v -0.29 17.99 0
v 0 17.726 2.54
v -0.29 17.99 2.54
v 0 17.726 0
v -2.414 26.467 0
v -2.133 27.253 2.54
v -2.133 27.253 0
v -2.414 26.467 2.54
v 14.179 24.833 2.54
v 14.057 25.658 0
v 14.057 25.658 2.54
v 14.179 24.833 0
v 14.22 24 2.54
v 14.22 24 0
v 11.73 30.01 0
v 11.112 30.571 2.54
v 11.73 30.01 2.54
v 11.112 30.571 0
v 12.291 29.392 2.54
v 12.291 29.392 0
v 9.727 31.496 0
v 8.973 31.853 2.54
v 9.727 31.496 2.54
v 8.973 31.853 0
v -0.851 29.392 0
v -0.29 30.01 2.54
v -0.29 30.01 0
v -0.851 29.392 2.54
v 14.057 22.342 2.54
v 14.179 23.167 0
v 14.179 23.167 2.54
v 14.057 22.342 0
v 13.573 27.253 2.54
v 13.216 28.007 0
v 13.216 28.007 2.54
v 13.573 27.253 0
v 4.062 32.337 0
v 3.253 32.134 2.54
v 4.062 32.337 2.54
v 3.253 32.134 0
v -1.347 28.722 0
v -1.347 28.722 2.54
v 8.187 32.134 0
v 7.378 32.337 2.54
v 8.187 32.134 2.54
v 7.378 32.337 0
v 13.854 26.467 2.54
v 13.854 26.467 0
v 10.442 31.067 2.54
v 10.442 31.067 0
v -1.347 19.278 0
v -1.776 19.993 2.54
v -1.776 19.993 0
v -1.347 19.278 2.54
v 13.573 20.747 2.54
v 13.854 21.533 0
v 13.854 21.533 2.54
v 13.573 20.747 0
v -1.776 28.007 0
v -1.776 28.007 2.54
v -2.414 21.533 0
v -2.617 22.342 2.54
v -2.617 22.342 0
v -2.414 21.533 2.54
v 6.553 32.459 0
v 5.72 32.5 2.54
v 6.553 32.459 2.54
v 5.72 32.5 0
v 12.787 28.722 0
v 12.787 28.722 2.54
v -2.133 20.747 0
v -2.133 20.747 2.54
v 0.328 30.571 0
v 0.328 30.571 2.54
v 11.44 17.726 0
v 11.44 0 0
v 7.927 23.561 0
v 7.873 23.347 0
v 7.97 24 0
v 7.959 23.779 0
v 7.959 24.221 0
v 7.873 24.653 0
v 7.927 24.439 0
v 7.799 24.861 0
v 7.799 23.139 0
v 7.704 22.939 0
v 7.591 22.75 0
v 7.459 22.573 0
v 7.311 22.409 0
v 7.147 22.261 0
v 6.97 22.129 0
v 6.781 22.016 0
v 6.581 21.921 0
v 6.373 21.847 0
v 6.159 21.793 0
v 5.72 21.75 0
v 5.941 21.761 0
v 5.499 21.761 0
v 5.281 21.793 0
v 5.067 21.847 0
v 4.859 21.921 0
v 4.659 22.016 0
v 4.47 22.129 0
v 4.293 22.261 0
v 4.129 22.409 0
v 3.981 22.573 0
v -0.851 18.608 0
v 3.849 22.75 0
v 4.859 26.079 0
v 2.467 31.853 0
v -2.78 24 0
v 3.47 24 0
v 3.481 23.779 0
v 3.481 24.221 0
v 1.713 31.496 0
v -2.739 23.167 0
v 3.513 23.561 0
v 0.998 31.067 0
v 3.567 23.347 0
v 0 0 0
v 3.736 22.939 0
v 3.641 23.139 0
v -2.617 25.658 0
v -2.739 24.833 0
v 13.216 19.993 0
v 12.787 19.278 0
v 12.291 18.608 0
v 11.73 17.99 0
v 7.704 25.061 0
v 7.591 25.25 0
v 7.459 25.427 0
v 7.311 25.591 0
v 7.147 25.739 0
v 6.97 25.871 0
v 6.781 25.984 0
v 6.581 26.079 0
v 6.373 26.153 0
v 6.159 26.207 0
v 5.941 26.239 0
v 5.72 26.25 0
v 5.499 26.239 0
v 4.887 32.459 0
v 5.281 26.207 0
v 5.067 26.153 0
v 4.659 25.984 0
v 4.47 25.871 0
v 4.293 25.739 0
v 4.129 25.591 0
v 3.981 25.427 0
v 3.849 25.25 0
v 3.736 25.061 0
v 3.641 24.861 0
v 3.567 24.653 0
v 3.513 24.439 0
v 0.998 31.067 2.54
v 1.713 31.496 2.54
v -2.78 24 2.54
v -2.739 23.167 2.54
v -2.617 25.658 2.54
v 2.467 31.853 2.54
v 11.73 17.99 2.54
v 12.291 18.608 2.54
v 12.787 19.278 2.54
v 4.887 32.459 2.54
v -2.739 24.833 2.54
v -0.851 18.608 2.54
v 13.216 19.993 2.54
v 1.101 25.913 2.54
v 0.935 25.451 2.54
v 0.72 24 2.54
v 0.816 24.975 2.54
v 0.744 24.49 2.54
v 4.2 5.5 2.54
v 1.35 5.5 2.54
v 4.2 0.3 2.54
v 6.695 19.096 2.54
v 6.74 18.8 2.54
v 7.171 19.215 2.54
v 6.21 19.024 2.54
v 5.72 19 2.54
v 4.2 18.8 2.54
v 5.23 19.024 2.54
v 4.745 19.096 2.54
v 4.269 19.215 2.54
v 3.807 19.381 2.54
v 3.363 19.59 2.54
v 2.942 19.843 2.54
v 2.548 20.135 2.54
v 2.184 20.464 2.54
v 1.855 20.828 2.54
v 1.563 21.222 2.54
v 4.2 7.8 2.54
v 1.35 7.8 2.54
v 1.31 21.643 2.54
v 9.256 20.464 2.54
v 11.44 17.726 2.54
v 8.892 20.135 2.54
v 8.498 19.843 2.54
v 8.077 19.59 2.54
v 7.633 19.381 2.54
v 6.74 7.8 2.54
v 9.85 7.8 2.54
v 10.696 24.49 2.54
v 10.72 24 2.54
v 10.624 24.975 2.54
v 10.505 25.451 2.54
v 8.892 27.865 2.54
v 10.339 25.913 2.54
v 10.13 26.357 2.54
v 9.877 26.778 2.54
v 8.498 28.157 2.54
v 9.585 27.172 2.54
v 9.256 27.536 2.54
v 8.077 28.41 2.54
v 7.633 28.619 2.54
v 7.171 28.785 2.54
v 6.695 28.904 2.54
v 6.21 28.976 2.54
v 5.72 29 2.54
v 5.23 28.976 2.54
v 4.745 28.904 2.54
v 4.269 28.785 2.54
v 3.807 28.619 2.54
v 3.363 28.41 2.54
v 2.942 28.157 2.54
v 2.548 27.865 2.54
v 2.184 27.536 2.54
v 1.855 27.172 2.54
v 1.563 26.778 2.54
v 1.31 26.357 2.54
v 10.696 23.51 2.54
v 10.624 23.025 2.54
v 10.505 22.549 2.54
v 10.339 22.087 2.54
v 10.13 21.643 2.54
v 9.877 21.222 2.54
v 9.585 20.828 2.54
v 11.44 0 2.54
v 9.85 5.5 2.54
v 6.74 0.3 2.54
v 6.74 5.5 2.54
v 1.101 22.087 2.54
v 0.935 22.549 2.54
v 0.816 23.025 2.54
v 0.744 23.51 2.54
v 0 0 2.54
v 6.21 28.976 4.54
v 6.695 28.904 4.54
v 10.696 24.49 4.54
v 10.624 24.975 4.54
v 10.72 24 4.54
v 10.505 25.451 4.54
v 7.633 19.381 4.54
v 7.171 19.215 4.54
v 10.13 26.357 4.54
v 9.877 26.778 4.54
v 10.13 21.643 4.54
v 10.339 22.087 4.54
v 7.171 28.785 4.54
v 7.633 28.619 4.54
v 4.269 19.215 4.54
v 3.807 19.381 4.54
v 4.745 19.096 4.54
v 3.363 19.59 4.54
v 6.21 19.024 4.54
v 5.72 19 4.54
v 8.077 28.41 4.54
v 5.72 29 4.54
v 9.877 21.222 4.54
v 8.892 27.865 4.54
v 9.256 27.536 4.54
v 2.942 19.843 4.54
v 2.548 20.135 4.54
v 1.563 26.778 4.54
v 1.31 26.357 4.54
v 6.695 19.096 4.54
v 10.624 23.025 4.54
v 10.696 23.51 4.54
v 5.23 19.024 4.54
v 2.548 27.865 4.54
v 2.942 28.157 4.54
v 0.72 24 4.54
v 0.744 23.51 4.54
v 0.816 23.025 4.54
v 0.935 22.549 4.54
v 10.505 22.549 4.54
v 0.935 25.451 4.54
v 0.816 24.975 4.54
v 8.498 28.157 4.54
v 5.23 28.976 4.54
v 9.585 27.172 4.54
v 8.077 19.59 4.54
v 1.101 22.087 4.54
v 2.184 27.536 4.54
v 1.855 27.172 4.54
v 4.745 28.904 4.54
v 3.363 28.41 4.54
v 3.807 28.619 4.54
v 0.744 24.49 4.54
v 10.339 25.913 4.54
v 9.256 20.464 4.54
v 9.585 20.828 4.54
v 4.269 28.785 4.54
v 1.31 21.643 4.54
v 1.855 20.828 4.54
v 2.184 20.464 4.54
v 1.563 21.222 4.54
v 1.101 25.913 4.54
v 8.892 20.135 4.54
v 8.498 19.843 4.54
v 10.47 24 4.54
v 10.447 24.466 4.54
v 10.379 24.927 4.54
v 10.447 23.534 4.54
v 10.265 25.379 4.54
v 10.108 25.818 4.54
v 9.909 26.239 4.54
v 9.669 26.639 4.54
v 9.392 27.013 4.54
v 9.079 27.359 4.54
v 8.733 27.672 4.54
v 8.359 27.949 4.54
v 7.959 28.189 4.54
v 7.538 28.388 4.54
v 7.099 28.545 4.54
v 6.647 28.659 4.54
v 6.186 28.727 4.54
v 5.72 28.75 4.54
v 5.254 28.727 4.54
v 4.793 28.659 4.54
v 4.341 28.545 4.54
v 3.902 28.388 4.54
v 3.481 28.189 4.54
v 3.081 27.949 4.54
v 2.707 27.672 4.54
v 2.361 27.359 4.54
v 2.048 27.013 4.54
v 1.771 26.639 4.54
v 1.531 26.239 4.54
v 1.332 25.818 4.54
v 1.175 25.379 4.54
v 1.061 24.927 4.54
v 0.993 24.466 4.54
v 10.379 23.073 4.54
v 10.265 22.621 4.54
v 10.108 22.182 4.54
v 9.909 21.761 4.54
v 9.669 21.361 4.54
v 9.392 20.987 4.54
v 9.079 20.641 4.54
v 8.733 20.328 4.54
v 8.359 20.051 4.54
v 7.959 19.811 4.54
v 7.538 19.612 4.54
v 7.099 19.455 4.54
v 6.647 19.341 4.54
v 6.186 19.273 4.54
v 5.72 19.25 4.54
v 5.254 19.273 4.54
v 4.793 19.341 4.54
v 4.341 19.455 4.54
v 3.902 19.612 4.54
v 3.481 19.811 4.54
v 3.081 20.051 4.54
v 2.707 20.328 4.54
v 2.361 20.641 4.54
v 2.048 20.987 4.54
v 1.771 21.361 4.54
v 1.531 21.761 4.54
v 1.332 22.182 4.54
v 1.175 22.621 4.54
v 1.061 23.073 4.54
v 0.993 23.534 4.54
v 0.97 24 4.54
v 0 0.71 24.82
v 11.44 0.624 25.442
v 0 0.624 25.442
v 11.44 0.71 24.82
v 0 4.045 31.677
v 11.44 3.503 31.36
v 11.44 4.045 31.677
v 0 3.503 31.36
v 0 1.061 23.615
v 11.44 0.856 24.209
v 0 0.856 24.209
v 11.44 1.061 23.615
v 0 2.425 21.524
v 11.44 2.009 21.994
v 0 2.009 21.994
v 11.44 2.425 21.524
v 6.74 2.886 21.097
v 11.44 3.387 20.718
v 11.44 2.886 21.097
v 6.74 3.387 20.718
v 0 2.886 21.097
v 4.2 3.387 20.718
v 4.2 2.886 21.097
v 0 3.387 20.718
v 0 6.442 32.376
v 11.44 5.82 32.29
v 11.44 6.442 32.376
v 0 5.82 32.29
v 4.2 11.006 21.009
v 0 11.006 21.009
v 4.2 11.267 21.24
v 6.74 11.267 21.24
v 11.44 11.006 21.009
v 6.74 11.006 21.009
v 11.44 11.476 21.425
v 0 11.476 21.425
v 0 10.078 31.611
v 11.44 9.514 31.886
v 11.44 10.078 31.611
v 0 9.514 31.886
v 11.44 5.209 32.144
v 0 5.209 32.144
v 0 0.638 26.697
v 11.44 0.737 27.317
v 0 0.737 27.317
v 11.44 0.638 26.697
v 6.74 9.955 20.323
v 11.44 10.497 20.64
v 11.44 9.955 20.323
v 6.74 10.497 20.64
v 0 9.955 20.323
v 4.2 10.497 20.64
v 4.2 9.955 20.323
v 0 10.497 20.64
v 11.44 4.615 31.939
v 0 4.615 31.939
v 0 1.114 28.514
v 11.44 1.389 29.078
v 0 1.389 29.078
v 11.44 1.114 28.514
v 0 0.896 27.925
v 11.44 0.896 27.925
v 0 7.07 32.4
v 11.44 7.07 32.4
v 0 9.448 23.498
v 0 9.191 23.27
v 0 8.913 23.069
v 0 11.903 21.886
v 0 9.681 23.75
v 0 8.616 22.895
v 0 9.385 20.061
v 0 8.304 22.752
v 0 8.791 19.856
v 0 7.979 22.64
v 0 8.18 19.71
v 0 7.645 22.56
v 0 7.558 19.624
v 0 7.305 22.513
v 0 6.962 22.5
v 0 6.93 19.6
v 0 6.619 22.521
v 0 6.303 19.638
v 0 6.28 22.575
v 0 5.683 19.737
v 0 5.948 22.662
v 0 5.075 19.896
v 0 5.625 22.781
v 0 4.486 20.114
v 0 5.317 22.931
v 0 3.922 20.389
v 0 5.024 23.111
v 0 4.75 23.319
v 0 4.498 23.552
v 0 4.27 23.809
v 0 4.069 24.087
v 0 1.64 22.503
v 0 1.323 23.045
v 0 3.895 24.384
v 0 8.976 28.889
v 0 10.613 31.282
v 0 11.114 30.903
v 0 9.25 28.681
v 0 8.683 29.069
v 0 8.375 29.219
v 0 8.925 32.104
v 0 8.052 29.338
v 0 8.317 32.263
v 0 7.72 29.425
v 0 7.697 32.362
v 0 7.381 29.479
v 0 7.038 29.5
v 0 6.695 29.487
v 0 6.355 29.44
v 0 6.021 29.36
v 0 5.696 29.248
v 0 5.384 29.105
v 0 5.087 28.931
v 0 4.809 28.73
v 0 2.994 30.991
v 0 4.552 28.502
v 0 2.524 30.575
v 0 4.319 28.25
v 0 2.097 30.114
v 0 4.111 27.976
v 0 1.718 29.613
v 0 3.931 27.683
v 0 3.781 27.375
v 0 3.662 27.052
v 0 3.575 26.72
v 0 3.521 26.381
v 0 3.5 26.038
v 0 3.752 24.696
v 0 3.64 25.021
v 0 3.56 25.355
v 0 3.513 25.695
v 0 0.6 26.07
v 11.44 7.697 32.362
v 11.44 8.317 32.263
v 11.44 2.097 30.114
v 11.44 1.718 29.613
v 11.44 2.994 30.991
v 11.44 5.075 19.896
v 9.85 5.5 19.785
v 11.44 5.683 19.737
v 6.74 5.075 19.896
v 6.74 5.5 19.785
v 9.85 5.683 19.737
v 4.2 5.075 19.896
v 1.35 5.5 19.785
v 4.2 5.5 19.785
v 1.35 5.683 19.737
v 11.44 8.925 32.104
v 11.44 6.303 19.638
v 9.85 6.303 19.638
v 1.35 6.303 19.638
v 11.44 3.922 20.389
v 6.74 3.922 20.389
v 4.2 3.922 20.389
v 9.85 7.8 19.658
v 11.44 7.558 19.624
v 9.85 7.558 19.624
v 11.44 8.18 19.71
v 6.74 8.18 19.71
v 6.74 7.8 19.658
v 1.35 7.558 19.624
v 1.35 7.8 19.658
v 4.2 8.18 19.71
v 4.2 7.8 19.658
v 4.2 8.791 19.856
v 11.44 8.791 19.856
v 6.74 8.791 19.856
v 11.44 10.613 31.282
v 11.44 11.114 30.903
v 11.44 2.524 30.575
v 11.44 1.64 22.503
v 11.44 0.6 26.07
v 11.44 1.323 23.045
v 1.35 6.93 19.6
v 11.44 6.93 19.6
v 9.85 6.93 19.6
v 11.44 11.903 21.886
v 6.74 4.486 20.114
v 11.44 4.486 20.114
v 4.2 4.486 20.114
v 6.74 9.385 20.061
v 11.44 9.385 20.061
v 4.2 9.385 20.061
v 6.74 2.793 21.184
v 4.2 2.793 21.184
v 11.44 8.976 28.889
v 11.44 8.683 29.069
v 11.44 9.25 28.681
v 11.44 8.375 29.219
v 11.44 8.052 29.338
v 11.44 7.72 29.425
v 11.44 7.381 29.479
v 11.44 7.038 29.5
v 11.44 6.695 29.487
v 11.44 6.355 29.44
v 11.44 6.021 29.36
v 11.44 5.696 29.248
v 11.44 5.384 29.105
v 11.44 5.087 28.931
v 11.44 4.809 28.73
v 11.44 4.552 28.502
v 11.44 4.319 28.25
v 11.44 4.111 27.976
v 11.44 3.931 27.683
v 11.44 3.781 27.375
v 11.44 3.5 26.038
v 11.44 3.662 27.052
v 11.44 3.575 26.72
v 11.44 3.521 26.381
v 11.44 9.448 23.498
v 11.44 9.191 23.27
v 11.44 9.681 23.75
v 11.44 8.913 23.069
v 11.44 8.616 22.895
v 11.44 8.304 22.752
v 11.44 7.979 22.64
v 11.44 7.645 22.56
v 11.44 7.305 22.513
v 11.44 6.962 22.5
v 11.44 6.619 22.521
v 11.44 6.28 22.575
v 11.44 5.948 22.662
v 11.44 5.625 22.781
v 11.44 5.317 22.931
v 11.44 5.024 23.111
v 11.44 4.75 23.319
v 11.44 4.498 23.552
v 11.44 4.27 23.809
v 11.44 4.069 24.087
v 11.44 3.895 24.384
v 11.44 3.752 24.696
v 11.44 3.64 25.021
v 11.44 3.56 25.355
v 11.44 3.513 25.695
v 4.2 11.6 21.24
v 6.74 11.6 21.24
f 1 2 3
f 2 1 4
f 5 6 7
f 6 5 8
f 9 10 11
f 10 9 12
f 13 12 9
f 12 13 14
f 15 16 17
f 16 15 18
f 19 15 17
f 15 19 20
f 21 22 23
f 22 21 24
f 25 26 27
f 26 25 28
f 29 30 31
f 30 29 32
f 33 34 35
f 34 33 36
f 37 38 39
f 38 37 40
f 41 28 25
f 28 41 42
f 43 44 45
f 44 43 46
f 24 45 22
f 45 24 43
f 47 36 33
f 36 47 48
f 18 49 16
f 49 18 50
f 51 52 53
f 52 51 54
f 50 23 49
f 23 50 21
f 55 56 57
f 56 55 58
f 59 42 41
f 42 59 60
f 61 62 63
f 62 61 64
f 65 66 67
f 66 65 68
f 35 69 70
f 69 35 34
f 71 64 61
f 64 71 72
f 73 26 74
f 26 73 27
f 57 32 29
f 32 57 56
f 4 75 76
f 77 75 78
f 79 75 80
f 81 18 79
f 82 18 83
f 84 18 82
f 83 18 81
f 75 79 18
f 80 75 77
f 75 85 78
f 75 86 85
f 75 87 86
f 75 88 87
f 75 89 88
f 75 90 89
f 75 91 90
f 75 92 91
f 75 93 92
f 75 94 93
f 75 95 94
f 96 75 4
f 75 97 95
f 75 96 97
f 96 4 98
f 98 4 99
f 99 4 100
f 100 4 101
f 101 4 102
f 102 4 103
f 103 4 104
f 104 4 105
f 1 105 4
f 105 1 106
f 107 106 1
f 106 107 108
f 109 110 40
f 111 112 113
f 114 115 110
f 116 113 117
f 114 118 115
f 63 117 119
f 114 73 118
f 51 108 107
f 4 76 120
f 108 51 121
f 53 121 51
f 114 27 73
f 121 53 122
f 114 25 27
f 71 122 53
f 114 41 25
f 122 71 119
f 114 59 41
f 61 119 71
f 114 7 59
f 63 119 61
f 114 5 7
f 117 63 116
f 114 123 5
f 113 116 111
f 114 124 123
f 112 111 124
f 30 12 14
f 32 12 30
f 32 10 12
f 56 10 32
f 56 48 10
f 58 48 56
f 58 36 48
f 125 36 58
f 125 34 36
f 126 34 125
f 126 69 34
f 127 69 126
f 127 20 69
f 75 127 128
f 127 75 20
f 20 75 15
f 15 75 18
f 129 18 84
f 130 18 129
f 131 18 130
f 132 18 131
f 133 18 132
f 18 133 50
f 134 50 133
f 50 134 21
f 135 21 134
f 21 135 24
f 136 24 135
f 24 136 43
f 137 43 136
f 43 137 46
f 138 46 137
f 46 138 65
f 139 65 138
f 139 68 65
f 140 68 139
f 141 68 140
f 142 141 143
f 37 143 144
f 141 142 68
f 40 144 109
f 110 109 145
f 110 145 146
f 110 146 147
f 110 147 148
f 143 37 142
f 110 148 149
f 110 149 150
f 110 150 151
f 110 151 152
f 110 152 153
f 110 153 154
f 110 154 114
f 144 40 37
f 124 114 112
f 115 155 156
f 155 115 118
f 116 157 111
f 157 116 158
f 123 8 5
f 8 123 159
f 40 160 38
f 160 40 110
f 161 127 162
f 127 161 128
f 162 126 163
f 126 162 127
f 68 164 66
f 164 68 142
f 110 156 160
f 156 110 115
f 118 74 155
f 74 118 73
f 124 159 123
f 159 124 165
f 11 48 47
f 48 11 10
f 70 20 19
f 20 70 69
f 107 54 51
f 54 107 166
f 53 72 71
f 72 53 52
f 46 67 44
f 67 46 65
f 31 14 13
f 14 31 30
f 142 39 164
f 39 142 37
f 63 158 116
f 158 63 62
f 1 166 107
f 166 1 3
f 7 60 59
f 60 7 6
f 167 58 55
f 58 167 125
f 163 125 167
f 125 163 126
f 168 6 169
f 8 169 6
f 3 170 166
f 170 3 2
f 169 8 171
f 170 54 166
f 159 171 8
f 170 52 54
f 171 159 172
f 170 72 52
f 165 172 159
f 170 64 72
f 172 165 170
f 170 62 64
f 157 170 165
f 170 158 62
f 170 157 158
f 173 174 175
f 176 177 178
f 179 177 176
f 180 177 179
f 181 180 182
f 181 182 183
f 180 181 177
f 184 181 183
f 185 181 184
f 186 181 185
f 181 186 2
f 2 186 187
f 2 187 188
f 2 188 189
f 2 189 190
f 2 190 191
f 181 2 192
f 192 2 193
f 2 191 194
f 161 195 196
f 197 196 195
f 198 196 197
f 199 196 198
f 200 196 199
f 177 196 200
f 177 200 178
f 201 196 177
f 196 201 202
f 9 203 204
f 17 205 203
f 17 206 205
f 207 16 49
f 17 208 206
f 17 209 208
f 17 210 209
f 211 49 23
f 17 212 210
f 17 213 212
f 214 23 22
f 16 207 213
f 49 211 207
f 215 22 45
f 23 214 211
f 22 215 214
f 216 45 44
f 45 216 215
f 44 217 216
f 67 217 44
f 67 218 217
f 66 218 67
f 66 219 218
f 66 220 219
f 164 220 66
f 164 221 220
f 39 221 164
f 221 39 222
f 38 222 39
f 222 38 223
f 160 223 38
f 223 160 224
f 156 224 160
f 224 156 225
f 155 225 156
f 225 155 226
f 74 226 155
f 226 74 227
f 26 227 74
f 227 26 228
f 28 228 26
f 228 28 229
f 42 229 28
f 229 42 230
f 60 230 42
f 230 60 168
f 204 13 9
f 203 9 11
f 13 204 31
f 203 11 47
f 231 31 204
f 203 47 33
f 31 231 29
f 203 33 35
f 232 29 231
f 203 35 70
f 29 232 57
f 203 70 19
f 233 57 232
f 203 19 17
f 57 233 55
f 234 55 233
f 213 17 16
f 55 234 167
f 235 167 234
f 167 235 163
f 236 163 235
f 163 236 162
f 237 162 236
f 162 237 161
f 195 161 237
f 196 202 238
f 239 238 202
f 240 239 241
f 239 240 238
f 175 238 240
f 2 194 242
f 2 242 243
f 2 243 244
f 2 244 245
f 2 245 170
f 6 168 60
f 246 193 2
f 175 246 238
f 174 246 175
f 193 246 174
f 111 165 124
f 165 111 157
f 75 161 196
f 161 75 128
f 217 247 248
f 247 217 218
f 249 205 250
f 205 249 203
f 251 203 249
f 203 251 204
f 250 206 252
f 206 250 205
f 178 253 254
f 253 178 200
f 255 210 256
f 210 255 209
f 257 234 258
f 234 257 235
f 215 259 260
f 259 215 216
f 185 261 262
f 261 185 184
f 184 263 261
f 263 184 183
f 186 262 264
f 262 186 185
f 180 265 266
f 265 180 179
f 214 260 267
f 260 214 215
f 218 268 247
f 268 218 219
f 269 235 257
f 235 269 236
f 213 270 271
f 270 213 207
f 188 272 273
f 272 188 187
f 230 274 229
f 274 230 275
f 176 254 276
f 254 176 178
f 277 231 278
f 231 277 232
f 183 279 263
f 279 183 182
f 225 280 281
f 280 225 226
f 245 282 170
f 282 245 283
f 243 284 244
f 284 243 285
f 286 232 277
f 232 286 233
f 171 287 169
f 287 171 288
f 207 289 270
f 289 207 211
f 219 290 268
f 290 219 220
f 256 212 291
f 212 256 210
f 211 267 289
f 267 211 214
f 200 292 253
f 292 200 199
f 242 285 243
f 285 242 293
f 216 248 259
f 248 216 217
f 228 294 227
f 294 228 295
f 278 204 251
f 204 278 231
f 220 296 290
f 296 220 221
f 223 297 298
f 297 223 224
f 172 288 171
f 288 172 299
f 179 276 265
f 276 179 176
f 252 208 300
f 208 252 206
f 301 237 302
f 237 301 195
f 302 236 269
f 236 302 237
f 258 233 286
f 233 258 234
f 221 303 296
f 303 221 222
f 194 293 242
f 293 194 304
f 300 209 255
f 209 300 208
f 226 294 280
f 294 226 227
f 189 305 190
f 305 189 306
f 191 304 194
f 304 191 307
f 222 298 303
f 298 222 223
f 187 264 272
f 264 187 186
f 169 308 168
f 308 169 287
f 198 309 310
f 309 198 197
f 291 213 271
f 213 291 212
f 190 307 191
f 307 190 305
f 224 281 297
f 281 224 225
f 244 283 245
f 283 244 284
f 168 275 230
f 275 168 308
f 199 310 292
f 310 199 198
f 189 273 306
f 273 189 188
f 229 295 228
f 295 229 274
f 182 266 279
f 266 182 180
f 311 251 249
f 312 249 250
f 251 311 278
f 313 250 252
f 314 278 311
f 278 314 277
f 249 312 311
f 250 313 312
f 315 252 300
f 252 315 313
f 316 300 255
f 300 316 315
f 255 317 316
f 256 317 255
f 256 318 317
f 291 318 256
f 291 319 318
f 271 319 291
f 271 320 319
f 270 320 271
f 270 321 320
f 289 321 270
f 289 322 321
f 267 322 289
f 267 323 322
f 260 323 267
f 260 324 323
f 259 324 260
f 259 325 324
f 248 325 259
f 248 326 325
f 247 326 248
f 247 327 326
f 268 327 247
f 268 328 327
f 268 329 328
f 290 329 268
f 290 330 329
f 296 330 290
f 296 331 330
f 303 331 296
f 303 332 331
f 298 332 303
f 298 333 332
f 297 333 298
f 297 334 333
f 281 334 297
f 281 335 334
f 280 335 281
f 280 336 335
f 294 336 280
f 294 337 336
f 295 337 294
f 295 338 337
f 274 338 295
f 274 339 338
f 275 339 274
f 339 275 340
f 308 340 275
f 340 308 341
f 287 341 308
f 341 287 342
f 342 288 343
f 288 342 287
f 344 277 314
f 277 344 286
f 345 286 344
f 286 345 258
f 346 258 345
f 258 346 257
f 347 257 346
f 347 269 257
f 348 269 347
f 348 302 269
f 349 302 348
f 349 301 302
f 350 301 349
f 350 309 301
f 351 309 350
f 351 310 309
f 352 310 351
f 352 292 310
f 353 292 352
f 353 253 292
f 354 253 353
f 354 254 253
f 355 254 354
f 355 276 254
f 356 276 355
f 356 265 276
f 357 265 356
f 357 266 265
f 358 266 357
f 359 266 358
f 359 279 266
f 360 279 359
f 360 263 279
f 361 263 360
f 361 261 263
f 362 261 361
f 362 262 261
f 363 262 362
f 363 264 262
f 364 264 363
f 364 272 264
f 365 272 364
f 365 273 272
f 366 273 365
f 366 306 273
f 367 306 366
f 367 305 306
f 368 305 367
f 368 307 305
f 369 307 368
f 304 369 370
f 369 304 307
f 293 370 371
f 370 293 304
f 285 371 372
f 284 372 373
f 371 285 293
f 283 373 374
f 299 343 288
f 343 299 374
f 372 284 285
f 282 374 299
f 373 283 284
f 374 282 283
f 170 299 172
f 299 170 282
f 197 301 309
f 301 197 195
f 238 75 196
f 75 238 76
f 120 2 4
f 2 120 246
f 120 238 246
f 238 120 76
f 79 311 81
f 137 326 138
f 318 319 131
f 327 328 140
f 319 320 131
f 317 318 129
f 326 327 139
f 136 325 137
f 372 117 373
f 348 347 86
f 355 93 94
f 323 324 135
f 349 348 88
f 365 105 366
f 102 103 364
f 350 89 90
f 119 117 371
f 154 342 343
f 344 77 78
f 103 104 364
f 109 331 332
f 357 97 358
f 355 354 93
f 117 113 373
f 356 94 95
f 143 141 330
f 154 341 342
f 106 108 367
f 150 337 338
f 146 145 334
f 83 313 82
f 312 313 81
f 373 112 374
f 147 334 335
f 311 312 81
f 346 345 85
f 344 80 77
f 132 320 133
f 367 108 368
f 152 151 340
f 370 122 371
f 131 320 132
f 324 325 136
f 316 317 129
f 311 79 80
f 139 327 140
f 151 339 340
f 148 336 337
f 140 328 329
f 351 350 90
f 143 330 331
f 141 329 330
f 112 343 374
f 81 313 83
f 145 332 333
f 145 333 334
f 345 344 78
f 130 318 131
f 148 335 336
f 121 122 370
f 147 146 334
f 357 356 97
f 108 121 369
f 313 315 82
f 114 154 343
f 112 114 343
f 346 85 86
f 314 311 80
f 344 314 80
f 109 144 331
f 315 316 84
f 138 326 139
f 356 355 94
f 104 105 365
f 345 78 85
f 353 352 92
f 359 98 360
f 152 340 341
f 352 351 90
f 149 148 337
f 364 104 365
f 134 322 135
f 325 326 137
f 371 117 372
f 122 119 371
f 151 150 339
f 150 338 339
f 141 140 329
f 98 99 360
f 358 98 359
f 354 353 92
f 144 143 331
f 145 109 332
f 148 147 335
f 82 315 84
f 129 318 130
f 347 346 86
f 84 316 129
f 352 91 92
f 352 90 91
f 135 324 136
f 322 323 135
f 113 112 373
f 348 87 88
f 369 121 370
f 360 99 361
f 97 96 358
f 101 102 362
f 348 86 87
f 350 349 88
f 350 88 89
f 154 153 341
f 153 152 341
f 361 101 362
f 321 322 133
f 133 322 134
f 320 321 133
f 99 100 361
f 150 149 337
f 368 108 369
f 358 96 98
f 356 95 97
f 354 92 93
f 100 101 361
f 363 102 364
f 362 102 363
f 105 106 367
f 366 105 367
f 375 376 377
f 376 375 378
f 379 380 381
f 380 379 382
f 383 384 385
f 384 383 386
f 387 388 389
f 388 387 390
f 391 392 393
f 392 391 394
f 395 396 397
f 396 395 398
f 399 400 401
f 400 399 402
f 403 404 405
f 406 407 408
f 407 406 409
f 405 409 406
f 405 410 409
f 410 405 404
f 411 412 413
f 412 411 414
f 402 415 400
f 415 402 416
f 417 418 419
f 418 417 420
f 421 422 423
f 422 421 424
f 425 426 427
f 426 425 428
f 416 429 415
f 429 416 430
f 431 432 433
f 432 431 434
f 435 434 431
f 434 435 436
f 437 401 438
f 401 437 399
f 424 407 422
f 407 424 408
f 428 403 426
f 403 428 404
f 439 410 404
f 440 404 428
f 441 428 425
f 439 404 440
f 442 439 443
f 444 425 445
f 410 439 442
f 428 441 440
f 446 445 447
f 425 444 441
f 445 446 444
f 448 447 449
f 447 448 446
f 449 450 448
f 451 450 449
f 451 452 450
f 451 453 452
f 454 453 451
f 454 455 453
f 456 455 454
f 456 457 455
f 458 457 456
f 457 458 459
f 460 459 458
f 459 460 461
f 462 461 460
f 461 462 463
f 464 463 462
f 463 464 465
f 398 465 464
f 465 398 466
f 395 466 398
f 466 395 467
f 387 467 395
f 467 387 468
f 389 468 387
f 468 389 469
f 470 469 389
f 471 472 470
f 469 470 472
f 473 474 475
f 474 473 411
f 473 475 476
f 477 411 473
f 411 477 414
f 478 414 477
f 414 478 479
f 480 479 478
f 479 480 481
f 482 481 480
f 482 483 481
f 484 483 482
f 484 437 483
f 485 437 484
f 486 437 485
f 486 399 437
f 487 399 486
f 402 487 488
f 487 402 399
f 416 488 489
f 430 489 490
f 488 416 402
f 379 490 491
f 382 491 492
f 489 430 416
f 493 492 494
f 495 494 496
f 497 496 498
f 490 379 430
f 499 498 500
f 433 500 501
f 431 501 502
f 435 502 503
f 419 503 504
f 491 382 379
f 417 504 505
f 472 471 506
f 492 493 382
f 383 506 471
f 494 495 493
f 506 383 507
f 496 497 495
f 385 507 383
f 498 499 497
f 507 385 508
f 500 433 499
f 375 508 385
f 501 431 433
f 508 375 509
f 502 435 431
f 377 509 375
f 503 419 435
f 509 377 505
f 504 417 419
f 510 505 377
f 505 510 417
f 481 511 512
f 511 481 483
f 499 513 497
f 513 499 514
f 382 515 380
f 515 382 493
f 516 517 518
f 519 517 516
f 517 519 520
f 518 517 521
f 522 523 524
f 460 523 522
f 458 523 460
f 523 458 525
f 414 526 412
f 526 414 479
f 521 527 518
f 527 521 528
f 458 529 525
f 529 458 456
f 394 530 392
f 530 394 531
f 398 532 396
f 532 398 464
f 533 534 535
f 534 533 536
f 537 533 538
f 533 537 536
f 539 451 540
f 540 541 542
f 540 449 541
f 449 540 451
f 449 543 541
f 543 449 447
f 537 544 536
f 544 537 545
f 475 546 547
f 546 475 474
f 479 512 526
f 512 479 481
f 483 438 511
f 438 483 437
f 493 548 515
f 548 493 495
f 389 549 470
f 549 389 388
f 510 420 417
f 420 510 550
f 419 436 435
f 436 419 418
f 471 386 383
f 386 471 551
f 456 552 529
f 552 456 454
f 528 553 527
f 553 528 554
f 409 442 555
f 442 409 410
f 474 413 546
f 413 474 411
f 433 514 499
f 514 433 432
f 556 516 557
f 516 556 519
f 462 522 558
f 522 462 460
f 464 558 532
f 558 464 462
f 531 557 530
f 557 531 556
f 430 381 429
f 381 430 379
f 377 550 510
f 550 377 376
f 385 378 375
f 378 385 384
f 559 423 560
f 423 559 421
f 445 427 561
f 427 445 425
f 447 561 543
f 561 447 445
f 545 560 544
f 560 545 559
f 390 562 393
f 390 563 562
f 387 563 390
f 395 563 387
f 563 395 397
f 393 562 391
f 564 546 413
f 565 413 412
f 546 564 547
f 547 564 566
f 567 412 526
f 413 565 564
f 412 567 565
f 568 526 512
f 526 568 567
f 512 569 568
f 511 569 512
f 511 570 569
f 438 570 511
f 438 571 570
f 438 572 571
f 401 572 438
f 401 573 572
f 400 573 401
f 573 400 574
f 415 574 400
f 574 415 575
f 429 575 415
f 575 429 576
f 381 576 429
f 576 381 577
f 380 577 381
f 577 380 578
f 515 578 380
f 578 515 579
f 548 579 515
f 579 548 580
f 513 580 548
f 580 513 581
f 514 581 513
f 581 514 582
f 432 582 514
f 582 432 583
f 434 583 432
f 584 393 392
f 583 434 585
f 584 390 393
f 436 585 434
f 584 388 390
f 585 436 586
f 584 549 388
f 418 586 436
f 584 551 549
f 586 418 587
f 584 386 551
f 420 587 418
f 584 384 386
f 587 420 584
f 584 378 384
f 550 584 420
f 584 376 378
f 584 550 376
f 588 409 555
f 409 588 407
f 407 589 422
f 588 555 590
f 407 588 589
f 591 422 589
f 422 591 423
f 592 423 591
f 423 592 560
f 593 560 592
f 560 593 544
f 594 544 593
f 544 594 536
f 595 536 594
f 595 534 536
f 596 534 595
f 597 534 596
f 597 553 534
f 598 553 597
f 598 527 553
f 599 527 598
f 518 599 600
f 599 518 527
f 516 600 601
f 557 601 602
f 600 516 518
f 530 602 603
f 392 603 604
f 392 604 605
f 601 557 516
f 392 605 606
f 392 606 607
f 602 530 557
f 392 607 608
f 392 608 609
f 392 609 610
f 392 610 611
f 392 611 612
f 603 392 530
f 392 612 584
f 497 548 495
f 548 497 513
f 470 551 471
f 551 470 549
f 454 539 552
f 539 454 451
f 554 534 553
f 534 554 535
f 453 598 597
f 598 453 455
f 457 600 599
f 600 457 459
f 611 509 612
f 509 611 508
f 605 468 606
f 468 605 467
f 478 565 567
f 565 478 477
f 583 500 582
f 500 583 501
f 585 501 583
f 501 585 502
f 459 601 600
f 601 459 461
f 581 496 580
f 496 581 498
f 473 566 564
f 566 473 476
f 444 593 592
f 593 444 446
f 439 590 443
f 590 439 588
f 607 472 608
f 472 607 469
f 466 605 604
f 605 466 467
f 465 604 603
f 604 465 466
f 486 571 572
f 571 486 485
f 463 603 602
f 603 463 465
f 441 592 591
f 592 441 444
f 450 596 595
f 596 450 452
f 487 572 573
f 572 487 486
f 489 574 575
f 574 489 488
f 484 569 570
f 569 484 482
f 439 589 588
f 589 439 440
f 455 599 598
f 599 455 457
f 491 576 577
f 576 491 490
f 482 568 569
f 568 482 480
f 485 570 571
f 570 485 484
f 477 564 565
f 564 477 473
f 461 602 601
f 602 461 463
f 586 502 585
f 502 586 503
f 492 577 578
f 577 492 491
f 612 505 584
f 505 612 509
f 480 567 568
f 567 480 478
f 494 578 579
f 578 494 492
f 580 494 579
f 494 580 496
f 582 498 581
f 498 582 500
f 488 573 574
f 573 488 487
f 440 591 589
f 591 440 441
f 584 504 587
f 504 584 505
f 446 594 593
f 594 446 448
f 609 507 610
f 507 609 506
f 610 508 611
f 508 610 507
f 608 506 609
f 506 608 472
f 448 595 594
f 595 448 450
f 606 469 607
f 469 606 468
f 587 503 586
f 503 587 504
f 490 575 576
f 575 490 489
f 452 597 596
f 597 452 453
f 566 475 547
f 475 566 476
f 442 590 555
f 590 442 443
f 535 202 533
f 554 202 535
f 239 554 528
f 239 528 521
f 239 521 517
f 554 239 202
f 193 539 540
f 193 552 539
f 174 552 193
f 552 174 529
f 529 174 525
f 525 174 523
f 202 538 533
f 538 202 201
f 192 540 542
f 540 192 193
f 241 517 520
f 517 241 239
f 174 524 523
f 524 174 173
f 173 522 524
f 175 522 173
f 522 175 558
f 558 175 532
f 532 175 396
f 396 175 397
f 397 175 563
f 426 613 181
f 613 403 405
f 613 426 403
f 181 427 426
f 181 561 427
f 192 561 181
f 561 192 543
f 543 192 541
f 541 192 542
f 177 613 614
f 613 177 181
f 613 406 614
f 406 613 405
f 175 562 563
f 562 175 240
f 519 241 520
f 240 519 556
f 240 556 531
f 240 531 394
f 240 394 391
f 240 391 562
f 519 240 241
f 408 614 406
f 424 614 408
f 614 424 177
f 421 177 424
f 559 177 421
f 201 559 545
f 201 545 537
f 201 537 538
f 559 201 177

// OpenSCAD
/* Copyleft Roy Sigurd Karlsbakk <roy@karlsbakk.net> 2019
 * Dings for å ersatatte drit fra Plantasjen
 *
 * Lisens  CC BY-NC https://creativecommons.org/licenses/by-nc/4.0/legalcode.no
 * License CC BY-NC https://creativecommons.org/licenses/by-nc/4.0/legalcode
 */

$fn=64;

cube_x=11.44;
cube_y=19.25;
cube_z=2.54;

wall_width=cube_z;

bottom_cube=[cube_x,cube_y,cube_z];
circle_center=[cube_x/2,24];
outer_circle_d=17;
cone_outer_d=10;
cone_inner_d=4.5;
cone_edge=0.5;
screw_cyl_height=2;
cone_height=screw_cyl_height+cube_z;
out_pin_thickness=2.54;
out_pin_x=8.5;
out_pin_y=2.3;
out_pin_z=18;
out_pin_origo=[1.35,5.5,cube_z];
back_out_y_bottom=0.5;
back_out_y_top=3.2;
front_out_y_bottom=back_out_y_bottom+19;
front_out_y_top=back_out_y_top+9;

module strikkepinnering(width, ring_radius, height=1, rotational_angle=360) {
    scale([1,1,height]) {
        rotate_extrude(angle=rotational_angle, convexity = 10)
            translate([ring_radius, 0, 0])
                circle(d = width);

        if (rotational_angle < 360) {
            translate([ring_radius, 0, 0])
                sphere(d = width);

            rotate(a=[0,0,rotational_angle])
                translate([ring_radius, 0, 0])
                    sphere(d = width);
        }
    }
}

module festering(width, outer_d, inner_d, rotational_angle=360) {
    difference() {
        cylinder(d=outer_d, h=width);
        cylinder(d=inner_d, h=width);
        translate([0,0,0]) {
            rotate([0,0,0]) {
                cube([6.5,6.5,cube_x]);
            }
        }
    }
}

module base() {
    cube(bottom_cube);
    translate(circle_center)  {
        cylinder(d=outer_circle_d,h=cube_z);
        cylinder(h=cone_height,d=cone_outer_d);
    }
}

module trekantdings() {
    fra_x=4.2;
    fra_y=0.3;
    trekanthoyde=18.7;
    trekantfram_topp=8.2;
    trekantfram_bunn=18.5;
    helling_y=2.5;
    trekantdybde_y=8.8;
    
    polyhedron(
        points=[
            [fra_x,fra_y,cube_z],                                                   // 0
            [fra_x,fra_y+trekantfram_bunn,cube_z],                                  // 1
            [fra_x+wall_width,fra_y+trekantfram_bunn,cube_z],                       // 2
            [fra_x+wall_width,fra_y,cube_z],                                        // 3
            [fra_x,fra_y+helling_y,cube_z+trekanthoyde],                            // 4
            [fra_x,fra_y+helling_y+trekantdybde_y,cube_z+trekanthoyde],             // 5
            [fra_x+wall_width,fra_y+helling_y+trekantdybde_y,cube_z+trekanthoyde],  // 6
            [fra_x+wall_width,fra_y+helling_y,cube_z+trekanthoyde]                  // 7
        ],
        faces=[
            [0,3,2,1],
            [1,2,6,5],
            [4,5,6,7],
            [0,4,7,3],
            [0,1,5,4],
            [2,3,7,6],
        ]
    );
}
difference() {
    base();
    translate(circle_center)  {
        cylinder(d1=cone_inner_d,d2=cone_outer_d-cone_edge,h=cone_height);
    }
}
translate(out_pin_origo) {
    cube([out_pin_x,out_pin_y,out_pin_z]);
}
trekantdings();

translate([0,7,26]) {
    rotate([90,40,90]) {
        festering(width=cube_x, outer_d=12.8, inner_d=7);
    }
}
